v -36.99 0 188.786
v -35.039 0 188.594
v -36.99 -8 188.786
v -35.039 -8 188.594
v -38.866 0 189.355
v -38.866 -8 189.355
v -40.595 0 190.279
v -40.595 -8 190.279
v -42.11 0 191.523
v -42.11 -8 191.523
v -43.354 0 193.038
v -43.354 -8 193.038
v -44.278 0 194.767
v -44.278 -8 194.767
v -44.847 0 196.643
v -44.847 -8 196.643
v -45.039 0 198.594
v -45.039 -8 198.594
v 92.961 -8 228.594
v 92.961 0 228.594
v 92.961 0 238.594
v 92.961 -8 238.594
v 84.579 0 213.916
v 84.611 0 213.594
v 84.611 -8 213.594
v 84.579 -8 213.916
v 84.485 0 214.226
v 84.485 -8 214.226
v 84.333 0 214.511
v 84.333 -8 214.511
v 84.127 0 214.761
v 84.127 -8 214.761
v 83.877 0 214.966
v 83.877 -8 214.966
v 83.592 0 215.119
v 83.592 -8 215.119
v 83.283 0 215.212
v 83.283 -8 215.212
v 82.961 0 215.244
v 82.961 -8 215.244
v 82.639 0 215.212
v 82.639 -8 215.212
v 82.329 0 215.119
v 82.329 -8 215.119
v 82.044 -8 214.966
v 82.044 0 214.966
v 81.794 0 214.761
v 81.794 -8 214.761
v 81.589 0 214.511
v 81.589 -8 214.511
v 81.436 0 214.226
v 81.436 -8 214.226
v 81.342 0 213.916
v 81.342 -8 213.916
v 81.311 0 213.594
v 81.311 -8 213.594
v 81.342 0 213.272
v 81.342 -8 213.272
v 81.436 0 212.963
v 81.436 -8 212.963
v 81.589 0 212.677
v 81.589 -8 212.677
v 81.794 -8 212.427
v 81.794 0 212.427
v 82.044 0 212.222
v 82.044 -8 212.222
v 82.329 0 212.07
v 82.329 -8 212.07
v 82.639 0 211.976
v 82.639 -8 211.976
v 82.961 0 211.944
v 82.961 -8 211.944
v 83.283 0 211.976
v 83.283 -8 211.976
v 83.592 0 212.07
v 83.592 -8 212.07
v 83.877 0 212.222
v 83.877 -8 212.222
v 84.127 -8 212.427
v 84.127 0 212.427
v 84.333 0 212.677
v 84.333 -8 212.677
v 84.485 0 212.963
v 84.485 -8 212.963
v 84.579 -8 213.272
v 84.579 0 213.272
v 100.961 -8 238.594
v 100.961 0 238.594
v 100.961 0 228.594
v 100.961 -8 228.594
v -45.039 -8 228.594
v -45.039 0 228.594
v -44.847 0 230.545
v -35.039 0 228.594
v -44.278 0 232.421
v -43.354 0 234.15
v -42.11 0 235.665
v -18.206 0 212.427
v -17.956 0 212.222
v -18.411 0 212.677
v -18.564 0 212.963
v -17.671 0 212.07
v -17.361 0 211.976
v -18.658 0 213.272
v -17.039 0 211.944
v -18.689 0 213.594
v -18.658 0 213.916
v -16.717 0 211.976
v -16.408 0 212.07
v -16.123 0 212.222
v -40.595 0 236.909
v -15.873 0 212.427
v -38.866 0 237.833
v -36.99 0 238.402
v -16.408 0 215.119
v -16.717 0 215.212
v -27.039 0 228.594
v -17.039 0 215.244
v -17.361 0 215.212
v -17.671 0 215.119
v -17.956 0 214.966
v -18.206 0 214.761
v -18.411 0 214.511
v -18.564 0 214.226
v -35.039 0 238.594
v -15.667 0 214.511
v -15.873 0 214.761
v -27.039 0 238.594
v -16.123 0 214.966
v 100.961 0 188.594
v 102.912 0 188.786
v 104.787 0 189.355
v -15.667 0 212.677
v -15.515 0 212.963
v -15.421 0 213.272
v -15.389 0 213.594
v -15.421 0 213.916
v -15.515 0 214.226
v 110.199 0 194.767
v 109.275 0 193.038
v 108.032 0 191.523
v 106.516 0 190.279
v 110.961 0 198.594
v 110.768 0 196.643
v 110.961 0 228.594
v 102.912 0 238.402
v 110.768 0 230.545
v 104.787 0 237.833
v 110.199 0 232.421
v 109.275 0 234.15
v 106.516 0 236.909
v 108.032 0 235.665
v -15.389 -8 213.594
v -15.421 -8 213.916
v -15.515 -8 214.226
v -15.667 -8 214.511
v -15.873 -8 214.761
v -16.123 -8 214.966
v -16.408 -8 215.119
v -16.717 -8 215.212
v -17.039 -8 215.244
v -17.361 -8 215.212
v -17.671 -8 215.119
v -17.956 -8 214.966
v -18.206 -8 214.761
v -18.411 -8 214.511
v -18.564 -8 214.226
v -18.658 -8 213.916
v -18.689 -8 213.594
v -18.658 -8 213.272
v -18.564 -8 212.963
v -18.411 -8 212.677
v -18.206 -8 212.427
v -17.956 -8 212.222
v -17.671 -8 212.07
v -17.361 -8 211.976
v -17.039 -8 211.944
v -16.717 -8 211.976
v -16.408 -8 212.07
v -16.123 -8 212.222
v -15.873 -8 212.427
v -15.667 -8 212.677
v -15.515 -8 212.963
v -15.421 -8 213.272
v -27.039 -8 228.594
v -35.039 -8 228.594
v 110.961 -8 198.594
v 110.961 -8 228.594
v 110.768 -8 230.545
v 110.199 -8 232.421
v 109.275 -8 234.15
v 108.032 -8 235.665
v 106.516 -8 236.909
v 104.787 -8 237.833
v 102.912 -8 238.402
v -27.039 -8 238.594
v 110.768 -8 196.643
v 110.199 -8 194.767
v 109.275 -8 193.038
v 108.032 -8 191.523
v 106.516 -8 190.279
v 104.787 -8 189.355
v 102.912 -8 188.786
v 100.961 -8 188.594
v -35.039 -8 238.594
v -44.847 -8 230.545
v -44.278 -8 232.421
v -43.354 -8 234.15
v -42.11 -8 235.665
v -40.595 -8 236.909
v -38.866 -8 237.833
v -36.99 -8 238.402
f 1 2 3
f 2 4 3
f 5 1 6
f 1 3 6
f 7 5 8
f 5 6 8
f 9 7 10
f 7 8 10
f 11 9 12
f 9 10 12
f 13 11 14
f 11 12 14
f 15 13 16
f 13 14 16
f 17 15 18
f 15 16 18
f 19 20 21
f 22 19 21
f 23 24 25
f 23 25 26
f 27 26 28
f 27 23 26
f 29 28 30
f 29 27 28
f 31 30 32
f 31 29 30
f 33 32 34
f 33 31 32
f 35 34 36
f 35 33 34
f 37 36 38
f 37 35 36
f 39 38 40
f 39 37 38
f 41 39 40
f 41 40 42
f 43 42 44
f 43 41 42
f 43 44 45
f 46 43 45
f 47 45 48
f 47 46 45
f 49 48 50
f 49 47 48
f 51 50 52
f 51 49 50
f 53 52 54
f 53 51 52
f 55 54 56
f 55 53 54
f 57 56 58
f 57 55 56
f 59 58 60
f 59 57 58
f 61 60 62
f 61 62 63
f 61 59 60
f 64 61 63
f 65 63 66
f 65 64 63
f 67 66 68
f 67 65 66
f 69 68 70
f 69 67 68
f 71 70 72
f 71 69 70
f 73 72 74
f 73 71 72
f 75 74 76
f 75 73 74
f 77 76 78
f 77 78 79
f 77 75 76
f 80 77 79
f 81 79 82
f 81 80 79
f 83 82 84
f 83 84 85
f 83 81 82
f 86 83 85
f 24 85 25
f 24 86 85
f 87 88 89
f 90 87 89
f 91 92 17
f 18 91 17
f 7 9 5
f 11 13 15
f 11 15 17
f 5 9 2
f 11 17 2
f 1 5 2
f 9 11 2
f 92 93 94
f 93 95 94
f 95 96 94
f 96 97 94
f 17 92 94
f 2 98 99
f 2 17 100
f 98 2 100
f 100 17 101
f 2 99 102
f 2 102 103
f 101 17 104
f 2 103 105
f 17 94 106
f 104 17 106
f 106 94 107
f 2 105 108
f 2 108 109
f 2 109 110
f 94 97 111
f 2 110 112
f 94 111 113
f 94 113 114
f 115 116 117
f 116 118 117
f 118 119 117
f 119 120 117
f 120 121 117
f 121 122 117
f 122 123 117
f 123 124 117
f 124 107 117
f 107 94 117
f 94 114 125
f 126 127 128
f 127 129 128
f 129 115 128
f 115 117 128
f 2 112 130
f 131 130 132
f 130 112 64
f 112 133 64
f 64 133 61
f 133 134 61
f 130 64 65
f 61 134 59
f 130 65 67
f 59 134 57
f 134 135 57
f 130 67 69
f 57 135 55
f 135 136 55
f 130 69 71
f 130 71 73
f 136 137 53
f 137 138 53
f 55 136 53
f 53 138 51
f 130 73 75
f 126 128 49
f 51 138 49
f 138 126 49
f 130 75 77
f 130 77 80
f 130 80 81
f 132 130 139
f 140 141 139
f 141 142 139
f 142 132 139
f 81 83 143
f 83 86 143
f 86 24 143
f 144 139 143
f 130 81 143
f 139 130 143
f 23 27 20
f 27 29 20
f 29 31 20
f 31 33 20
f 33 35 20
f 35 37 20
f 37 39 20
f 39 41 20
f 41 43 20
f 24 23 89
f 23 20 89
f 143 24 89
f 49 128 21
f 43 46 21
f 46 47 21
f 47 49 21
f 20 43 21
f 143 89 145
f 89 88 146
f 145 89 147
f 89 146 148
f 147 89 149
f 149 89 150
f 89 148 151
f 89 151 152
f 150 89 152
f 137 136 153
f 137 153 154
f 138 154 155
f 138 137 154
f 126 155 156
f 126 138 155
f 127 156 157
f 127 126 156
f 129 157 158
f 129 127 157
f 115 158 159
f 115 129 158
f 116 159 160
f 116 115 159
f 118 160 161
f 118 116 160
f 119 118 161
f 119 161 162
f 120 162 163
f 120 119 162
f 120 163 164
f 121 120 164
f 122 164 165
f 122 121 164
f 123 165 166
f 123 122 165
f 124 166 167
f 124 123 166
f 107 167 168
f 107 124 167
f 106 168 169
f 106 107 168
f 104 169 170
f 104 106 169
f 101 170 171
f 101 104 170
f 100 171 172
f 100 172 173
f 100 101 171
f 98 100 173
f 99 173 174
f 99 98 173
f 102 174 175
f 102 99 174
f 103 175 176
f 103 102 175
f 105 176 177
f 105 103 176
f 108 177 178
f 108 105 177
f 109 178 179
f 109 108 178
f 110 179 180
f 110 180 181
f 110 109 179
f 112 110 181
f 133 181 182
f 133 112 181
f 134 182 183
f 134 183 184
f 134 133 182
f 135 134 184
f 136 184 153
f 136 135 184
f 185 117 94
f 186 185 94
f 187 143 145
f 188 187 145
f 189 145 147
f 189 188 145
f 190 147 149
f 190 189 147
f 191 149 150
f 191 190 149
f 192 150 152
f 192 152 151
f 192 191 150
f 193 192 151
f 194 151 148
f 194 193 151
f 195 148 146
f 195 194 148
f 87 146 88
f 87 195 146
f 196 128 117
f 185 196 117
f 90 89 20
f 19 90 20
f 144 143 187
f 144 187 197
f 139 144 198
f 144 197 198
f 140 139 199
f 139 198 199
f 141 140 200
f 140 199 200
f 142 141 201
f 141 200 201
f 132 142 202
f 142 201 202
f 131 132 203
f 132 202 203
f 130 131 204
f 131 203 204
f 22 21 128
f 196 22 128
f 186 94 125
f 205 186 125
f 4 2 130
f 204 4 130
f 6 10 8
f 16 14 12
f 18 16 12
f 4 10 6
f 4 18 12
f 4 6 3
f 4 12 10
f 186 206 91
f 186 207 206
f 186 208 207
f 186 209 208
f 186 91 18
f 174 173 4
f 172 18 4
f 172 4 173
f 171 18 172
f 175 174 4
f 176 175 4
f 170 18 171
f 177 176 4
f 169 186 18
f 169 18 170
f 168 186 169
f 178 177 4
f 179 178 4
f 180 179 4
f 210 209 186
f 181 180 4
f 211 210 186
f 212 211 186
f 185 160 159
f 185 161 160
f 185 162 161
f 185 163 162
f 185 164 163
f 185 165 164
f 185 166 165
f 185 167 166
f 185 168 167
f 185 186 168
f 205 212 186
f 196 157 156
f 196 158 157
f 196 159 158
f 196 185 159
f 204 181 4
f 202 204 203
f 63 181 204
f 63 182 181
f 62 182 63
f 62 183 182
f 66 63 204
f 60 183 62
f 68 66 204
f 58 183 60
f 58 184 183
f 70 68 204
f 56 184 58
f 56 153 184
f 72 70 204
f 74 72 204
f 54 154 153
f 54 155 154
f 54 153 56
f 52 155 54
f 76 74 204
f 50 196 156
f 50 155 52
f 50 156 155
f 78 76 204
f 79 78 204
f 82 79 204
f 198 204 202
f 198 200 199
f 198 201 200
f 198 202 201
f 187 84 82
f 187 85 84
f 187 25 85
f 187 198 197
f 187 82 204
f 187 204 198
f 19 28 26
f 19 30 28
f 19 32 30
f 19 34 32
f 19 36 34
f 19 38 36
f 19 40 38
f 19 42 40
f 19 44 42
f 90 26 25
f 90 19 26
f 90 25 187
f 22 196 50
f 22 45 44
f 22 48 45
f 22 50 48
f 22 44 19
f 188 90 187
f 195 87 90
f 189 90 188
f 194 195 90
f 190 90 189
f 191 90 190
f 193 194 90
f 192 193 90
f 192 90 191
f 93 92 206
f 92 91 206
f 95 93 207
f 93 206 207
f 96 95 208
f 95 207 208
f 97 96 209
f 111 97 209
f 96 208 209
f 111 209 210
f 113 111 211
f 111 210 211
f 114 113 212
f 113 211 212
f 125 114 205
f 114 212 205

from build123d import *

# Parameters (mm, degrees)
F0_R     = 1.65
F1_DEPTH = 8
F2_R     = 9.99999


# Not quite as in the source:
# - a fillet or chamfer is up to 0.001 mm smaller than in the source, because OpenCascade refuses the exact size


with BuildPart() as f1:
    # F0 (on Front) → F1 (new body)
    with BuildSketch(Plane.XZ):
        Polygon((-27.0393844694, 188.5941594839), (92.9606155306, 188.5941594839), (110.9606155306, 188.5941594839), (110.9606155306, 238.5941594839), (100.9606155306, 238.5941594839), (100.9606155306, 228.5941594839), (92.9606155306, 228.5941594839), (92.9606155306, 238.5941594839), (-27.0393844694, 238.5941594839), (-27.0393844694, 228.5941594839), (-35.0393844694, 228.5941594839), (-35.0393844694, 238.5941594839), (-45.0393844694, 238.5941594839), (-45.0393844694, 188.5941594839), align=None)
        with Locations((-17.0393844694, 213.5941594839)):
            Circle(F0_R, mode=Mode.SUBTRACT)
        with Locations((82.9606155306, 213.5941594839)):
            Circle(F0_R, mode=Mode.SUBTRACT)
    extrude(amount=F1_DEPTH)

    # F2 (radius 10 in the source; OpenCascade refuses exactly that, so slightly less here)
    f2_edges = [f1.edges().sort_by_distance(p)[0] for p in [
        (-45.039384, -4, 238.594159),
        (-45.039384, -4, 188.594159),
        (110.960616, -4, 188.594159),
        (110.960616, -4, 238.594159),
    ]]
    fillet(f2_edges, radius=F2_R)


solid = f1.part
